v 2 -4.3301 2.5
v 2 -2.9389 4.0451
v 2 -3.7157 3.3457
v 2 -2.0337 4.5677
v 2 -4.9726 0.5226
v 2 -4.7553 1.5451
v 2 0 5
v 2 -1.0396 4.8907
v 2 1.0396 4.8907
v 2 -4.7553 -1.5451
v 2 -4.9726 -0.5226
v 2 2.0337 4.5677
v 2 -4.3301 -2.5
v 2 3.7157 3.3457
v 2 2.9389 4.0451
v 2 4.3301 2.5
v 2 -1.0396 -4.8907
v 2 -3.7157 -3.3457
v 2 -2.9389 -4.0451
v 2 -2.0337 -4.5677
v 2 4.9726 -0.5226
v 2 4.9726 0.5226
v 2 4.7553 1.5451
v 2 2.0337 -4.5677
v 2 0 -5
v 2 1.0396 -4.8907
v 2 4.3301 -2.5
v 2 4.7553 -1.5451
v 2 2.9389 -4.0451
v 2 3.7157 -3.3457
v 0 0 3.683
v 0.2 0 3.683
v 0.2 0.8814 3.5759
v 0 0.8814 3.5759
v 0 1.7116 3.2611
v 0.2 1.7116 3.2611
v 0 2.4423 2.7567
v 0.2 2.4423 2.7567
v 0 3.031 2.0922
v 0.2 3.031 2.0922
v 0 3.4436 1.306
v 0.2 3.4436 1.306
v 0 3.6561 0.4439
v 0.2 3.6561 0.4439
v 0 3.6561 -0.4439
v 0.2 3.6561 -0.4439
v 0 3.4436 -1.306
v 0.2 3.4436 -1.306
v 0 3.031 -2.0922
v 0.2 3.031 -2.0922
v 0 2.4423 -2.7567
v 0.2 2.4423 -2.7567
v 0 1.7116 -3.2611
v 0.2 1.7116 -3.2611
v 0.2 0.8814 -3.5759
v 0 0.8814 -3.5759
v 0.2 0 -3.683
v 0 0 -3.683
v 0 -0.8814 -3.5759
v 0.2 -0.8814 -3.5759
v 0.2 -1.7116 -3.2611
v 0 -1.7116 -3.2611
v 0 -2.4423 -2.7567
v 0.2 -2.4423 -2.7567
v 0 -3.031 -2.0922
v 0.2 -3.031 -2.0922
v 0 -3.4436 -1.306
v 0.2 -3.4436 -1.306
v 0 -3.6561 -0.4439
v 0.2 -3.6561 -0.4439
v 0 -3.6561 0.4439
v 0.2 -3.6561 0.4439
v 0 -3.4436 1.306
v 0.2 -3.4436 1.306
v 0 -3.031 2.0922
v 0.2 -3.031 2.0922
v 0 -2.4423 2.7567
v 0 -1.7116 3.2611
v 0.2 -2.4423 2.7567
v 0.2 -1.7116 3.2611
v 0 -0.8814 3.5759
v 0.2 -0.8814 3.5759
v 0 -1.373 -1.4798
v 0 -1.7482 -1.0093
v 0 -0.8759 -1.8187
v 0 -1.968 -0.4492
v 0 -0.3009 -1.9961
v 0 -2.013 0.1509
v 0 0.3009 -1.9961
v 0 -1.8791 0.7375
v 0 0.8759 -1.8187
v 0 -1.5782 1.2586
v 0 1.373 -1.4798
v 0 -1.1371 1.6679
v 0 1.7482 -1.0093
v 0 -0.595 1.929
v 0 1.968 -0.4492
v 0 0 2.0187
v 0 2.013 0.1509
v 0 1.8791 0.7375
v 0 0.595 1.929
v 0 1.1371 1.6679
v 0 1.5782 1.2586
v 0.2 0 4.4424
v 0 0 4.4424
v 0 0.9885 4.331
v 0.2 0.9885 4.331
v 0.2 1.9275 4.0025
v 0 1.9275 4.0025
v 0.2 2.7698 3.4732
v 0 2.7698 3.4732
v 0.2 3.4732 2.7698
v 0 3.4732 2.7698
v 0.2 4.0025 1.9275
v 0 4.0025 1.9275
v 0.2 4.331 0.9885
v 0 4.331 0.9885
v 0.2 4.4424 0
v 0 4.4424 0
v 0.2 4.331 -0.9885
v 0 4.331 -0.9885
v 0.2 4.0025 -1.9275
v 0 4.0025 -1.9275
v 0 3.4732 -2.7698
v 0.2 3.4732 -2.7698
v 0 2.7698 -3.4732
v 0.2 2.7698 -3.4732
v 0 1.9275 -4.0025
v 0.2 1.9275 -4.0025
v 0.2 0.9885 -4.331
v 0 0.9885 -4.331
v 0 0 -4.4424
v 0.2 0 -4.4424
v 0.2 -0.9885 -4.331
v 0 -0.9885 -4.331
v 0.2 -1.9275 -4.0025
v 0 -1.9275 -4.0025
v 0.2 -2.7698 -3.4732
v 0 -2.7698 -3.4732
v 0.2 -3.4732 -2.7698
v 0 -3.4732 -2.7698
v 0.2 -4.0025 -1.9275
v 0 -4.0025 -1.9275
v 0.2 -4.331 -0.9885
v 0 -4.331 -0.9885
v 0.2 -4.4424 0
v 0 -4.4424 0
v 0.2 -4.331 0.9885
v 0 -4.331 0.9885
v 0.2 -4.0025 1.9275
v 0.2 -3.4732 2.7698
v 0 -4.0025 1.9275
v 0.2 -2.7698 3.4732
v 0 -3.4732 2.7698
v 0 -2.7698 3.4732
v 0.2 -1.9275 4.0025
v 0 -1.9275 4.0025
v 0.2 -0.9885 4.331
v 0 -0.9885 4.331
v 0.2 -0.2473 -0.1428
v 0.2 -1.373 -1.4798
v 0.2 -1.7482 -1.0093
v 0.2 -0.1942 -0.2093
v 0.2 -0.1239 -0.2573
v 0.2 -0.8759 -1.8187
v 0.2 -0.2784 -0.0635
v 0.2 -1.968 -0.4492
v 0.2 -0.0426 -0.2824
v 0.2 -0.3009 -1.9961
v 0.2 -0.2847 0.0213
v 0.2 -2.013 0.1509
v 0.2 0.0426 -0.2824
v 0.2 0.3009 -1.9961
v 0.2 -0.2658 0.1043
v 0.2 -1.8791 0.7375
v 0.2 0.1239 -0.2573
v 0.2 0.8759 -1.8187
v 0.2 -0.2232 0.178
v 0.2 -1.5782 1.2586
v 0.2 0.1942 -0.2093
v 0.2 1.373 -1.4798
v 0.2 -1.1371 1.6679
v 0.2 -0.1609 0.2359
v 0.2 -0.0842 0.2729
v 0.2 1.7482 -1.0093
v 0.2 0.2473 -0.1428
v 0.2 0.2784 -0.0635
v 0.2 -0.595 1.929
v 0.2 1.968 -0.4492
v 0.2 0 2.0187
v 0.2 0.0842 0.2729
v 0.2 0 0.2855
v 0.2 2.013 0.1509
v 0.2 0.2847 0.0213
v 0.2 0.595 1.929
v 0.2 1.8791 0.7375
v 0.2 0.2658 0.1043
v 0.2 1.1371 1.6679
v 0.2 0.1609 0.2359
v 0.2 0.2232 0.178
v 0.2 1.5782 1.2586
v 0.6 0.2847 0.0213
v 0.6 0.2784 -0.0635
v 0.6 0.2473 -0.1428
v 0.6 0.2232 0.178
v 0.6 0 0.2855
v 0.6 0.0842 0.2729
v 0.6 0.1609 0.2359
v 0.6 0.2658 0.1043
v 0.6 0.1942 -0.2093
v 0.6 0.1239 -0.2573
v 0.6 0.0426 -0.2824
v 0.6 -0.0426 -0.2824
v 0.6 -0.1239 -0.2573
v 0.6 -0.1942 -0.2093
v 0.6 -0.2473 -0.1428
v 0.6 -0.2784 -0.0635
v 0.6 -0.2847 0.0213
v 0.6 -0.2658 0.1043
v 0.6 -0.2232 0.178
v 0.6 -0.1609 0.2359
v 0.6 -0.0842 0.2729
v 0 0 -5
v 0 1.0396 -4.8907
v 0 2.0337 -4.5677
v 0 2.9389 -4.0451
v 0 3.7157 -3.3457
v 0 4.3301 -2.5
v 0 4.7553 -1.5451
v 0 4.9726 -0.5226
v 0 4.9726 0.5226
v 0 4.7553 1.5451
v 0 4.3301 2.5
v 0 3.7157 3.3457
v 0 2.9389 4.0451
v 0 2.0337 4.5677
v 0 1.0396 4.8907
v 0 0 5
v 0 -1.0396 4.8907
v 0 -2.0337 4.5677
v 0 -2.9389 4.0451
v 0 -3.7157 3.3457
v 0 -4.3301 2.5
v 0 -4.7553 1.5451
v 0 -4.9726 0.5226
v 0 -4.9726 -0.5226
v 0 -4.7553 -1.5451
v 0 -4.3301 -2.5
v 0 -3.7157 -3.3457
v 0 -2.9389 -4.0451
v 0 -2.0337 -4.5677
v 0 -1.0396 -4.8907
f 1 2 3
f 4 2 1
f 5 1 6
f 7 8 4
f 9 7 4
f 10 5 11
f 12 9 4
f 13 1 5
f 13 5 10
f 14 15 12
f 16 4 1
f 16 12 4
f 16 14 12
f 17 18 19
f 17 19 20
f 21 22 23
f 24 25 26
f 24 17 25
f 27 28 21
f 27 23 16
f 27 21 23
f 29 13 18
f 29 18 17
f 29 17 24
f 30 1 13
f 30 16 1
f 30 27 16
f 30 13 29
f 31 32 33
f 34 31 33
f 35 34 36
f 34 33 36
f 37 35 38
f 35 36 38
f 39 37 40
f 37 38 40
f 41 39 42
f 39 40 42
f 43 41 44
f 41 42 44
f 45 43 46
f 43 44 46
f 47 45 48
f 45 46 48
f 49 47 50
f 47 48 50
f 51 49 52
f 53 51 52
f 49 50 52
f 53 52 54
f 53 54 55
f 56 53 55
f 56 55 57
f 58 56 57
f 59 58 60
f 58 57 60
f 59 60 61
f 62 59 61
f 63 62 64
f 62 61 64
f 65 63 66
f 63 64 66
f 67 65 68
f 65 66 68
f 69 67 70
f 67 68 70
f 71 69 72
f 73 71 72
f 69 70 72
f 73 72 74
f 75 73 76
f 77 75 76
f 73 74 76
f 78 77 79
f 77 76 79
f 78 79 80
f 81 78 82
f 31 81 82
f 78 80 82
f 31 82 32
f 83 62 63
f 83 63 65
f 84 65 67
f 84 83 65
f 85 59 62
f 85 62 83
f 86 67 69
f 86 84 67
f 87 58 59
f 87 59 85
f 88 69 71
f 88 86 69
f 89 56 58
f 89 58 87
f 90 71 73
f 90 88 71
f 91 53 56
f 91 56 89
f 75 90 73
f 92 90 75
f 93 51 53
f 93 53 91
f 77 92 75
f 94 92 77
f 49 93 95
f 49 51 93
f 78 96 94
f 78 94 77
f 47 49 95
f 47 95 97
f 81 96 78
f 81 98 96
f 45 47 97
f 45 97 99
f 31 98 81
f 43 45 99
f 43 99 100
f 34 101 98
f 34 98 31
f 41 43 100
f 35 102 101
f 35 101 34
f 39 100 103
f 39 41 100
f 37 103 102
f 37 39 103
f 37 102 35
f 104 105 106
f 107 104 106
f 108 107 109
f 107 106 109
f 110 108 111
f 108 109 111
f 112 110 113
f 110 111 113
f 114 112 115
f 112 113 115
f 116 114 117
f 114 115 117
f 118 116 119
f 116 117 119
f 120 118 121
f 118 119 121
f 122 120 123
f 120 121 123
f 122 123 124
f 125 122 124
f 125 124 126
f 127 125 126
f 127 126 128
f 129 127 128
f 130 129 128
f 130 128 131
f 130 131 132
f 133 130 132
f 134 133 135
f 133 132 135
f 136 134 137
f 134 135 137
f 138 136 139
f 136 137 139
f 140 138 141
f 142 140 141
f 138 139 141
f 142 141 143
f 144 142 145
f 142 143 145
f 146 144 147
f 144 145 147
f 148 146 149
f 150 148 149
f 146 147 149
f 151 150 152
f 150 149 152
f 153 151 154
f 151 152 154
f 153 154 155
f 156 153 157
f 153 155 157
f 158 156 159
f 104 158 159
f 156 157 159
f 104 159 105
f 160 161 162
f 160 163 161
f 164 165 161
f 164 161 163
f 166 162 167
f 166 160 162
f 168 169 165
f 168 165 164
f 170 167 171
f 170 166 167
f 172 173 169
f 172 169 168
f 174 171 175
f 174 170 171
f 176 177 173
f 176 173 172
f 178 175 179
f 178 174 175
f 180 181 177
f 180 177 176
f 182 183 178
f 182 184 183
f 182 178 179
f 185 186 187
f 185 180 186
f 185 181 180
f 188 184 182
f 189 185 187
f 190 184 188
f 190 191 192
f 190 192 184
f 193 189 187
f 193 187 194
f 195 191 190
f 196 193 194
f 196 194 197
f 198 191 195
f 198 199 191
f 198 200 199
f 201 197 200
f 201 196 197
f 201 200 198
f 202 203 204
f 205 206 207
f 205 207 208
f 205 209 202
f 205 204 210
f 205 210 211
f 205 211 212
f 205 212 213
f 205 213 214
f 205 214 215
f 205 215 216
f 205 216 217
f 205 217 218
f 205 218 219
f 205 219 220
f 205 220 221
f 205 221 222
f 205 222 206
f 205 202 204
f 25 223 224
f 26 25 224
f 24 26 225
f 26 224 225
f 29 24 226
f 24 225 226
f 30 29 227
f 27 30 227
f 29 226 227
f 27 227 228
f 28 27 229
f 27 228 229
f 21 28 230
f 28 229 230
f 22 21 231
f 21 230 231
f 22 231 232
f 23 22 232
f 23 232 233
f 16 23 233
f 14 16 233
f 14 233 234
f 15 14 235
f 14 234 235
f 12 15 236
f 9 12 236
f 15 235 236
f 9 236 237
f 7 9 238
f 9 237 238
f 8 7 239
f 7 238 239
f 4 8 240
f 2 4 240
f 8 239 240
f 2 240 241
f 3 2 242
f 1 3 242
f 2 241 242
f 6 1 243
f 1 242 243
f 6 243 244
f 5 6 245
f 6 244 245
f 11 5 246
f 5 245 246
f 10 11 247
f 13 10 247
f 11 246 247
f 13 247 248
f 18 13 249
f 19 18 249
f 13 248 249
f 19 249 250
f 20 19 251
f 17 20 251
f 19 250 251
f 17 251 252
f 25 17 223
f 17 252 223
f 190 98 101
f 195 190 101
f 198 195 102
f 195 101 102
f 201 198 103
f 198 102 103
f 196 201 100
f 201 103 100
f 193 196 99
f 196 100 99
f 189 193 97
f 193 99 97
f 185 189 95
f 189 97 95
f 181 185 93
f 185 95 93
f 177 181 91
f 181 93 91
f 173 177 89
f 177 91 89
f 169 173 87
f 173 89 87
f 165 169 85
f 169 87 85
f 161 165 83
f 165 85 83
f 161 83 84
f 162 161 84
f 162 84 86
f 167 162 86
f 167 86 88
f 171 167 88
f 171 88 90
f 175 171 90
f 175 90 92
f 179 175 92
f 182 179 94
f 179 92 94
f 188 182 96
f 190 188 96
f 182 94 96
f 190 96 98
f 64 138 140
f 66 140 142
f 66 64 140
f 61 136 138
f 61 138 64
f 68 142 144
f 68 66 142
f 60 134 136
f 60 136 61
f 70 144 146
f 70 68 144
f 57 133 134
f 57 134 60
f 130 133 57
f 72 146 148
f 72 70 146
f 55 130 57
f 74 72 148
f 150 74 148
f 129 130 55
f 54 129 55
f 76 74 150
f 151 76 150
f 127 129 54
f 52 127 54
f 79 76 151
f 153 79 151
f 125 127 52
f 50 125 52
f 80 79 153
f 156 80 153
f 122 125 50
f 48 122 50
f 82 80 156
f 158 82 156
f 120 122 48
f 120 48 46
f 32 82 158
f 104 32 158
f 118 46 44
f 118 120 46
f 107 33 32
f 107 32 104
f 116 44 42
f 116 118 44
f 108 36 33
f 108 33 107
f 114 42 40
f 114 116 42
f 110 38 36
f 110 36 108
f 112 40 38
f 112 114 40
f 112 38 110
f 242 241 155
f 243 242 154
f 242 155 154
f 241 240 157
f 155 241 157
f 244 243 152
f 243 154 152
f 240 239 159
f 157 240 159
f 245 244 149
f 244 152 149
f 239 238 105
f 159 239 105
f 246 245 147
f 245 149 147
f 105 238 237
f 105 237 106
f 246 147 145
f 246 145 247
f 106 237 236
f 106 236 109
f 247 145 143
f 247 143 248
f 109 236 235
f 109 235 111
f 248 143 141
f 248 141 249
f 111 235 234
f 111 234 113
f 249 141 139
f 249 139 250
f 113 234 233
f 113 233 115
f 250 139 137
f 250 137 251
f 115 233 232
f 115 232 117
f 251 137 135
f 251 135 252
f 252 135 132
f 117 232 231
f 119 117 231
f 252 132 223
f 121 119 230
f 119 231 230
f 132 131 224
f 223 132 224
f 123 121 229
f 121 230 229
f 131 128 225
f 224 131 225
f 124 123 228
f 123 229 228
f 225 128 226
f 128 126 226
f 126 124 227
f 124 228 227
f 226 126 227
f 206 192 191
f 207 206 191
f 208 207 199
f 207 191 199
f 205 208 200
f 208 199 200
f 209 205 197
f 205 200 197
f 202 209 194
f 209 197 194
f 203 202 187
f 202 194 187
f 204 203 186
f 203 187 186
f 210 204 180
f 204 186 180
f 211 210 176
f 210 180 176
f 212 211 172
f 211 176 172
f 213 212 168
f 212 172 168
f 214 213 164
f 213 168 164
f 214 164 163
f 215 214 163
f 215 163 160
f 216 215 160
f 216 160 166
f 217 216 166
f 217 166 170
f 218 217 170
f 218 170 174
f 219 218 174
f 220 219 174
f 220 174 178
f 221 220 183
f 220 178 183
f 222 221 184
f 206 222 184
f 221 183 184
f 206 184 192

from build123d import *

# Parameters (mm, degrees)
SKETCH_1_R          = 5
EXTRUDE_310_DEPTH   = 2
SKETCH_9_R          = 4.442422665
CUT_EXTRUDE_1_DEPTH = 0.2
SKETCH_10_R         = 3.682968426
EXTRUDE_1_DEPTH     = 0.2
SKETCH_11_R         = 2.01865338
CUT_EXTRUDE_2_DEPTH = 0.2
SKETCH_12_R         = 0.285545309
CUT_EXTRUDE_3_DEPTH = 0.4


with BuildPart() as part:
    # 草图1 → Extrude 310 (new body)
    with BuildSketch(Plane(origin=(0, 0, 0), x_dir=(0, 0, -1), z_dir=(1, 0, 0))):
        Circle(SKETCH_1_R)
    extrude(amount=EXTRUDE_310_DEPTH)

    # 草图9 → 切除-拉伸1 (cut)
    with BuildSketch(Plane.ZY):
        Circle(SKETCH_9_R)
    extrude(amount=-CUT_EXTRUDE_1_DEPTH, mode=Mode.SUBTRACT)

    # 草图10 → 凸台-拉伸1 (add)
    with BuildSketch(Plane.ZY.offset(-0.2)):
        Circle(SKETCH_10_R)
    extrude(amount=EXTRUDE_1_DEPTH)

    # 草图11 → 切除-拉伸2 (cut)
    with BuildSketch(Plane.ZY):
        Circle(SKETCH_11_R)
    extrude(amount=-CUT_EXTRUDE_2_DEPTH, mode=Mode.SUBTRACT)

    # 草图12 → 切除-拉伸3 (cut)
    with BuildSketch(Plane.ZY.offset(-0.2)):
        Circle(SKETCH_12_R)
    extrude(amount=-CUT_EXTRUDE_3_DEPTH, mode=Mode.SUBTRACT)


solid = part.part
